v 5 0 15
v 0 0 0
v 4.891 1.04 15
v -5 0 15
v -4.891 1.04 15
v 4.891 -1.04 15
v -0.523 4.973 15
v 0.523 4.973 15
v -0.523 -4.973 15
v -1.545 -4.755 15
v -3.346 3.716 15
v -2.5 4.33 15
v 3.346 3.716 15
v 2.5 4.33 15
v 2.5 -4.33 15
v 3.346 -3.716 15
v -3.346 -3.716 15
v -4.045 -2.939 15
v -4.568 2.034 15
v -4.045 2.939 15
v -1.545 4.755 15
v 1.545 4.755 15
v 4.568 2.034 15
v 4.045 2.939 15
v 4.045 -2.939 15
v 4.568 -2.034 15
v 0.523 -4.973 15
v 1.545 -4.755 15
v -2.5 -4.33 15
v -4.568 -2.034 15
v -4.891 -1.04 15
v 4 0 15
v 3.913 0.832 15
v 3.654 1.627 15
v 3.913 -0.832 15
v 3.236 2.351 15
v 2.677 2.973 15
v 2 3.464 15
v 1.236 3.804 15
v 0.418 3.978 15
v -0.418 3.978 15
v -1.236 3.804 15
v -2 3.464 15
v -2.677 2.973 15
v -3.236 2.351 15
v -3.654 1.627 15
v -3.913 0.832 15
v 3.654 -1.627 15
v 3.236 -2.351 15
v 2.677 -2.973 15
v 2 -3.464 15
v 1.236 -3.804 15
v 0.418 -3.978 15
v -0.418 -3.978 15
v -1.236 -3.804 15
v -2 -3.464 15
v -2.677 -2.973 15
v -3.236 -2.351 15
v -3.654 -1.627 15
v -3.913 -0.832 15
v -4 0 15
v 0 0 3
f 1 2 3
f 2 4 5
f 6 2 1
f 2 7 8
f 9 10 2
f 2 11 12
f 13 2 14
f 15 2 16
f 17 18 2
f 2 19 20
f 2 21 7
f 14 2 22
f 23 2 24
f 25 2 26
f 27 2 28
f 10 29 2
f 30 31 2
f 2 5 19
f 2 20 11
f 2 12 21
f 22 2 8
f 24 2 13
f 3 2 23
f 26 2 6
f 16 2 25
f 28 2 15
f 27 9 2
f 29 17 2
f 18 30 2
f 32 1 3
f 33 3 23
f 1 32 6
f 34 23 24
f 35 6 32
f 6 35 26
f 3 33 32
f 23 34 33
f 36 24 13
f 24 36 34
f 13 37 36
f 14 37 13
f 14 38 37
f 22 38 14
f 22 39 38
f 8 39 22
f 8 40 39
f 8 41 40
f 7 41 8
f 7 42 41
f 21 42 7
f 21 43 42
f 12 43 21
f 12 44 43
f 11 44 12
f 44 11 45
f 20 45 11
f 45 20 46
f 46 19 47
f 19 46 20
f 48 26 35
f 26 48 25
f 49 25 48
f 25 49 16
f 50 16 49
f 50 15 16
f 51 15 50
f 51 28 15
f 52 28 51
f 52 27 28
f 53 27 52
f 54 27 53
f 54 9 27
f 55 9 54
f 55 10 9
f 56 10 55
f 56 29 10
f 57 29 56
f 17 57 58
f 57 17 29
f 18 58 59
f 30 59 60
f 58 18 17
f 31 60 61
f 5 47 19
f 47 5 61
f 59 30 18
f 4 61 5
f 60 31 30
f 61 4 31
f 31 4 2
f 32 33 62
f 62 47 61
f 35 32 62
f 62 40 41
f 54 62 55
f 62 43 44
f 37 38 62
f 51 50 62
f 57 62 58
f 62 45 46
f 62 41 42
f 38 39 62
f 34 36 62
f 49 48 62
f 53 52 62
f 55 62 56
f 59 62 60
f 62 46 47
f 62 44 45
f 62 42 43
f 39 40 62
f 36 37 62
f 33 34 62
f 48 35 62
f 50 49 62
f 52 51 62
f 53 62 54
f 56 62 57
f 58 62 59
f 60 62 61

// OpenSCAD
difference() {
  cylinder(r1=0, r2=5, h=15, $fn=30);
  translate([0, 0, 3]) cylinder(r1=0, r2=5, h=15, $fn=30);
}
